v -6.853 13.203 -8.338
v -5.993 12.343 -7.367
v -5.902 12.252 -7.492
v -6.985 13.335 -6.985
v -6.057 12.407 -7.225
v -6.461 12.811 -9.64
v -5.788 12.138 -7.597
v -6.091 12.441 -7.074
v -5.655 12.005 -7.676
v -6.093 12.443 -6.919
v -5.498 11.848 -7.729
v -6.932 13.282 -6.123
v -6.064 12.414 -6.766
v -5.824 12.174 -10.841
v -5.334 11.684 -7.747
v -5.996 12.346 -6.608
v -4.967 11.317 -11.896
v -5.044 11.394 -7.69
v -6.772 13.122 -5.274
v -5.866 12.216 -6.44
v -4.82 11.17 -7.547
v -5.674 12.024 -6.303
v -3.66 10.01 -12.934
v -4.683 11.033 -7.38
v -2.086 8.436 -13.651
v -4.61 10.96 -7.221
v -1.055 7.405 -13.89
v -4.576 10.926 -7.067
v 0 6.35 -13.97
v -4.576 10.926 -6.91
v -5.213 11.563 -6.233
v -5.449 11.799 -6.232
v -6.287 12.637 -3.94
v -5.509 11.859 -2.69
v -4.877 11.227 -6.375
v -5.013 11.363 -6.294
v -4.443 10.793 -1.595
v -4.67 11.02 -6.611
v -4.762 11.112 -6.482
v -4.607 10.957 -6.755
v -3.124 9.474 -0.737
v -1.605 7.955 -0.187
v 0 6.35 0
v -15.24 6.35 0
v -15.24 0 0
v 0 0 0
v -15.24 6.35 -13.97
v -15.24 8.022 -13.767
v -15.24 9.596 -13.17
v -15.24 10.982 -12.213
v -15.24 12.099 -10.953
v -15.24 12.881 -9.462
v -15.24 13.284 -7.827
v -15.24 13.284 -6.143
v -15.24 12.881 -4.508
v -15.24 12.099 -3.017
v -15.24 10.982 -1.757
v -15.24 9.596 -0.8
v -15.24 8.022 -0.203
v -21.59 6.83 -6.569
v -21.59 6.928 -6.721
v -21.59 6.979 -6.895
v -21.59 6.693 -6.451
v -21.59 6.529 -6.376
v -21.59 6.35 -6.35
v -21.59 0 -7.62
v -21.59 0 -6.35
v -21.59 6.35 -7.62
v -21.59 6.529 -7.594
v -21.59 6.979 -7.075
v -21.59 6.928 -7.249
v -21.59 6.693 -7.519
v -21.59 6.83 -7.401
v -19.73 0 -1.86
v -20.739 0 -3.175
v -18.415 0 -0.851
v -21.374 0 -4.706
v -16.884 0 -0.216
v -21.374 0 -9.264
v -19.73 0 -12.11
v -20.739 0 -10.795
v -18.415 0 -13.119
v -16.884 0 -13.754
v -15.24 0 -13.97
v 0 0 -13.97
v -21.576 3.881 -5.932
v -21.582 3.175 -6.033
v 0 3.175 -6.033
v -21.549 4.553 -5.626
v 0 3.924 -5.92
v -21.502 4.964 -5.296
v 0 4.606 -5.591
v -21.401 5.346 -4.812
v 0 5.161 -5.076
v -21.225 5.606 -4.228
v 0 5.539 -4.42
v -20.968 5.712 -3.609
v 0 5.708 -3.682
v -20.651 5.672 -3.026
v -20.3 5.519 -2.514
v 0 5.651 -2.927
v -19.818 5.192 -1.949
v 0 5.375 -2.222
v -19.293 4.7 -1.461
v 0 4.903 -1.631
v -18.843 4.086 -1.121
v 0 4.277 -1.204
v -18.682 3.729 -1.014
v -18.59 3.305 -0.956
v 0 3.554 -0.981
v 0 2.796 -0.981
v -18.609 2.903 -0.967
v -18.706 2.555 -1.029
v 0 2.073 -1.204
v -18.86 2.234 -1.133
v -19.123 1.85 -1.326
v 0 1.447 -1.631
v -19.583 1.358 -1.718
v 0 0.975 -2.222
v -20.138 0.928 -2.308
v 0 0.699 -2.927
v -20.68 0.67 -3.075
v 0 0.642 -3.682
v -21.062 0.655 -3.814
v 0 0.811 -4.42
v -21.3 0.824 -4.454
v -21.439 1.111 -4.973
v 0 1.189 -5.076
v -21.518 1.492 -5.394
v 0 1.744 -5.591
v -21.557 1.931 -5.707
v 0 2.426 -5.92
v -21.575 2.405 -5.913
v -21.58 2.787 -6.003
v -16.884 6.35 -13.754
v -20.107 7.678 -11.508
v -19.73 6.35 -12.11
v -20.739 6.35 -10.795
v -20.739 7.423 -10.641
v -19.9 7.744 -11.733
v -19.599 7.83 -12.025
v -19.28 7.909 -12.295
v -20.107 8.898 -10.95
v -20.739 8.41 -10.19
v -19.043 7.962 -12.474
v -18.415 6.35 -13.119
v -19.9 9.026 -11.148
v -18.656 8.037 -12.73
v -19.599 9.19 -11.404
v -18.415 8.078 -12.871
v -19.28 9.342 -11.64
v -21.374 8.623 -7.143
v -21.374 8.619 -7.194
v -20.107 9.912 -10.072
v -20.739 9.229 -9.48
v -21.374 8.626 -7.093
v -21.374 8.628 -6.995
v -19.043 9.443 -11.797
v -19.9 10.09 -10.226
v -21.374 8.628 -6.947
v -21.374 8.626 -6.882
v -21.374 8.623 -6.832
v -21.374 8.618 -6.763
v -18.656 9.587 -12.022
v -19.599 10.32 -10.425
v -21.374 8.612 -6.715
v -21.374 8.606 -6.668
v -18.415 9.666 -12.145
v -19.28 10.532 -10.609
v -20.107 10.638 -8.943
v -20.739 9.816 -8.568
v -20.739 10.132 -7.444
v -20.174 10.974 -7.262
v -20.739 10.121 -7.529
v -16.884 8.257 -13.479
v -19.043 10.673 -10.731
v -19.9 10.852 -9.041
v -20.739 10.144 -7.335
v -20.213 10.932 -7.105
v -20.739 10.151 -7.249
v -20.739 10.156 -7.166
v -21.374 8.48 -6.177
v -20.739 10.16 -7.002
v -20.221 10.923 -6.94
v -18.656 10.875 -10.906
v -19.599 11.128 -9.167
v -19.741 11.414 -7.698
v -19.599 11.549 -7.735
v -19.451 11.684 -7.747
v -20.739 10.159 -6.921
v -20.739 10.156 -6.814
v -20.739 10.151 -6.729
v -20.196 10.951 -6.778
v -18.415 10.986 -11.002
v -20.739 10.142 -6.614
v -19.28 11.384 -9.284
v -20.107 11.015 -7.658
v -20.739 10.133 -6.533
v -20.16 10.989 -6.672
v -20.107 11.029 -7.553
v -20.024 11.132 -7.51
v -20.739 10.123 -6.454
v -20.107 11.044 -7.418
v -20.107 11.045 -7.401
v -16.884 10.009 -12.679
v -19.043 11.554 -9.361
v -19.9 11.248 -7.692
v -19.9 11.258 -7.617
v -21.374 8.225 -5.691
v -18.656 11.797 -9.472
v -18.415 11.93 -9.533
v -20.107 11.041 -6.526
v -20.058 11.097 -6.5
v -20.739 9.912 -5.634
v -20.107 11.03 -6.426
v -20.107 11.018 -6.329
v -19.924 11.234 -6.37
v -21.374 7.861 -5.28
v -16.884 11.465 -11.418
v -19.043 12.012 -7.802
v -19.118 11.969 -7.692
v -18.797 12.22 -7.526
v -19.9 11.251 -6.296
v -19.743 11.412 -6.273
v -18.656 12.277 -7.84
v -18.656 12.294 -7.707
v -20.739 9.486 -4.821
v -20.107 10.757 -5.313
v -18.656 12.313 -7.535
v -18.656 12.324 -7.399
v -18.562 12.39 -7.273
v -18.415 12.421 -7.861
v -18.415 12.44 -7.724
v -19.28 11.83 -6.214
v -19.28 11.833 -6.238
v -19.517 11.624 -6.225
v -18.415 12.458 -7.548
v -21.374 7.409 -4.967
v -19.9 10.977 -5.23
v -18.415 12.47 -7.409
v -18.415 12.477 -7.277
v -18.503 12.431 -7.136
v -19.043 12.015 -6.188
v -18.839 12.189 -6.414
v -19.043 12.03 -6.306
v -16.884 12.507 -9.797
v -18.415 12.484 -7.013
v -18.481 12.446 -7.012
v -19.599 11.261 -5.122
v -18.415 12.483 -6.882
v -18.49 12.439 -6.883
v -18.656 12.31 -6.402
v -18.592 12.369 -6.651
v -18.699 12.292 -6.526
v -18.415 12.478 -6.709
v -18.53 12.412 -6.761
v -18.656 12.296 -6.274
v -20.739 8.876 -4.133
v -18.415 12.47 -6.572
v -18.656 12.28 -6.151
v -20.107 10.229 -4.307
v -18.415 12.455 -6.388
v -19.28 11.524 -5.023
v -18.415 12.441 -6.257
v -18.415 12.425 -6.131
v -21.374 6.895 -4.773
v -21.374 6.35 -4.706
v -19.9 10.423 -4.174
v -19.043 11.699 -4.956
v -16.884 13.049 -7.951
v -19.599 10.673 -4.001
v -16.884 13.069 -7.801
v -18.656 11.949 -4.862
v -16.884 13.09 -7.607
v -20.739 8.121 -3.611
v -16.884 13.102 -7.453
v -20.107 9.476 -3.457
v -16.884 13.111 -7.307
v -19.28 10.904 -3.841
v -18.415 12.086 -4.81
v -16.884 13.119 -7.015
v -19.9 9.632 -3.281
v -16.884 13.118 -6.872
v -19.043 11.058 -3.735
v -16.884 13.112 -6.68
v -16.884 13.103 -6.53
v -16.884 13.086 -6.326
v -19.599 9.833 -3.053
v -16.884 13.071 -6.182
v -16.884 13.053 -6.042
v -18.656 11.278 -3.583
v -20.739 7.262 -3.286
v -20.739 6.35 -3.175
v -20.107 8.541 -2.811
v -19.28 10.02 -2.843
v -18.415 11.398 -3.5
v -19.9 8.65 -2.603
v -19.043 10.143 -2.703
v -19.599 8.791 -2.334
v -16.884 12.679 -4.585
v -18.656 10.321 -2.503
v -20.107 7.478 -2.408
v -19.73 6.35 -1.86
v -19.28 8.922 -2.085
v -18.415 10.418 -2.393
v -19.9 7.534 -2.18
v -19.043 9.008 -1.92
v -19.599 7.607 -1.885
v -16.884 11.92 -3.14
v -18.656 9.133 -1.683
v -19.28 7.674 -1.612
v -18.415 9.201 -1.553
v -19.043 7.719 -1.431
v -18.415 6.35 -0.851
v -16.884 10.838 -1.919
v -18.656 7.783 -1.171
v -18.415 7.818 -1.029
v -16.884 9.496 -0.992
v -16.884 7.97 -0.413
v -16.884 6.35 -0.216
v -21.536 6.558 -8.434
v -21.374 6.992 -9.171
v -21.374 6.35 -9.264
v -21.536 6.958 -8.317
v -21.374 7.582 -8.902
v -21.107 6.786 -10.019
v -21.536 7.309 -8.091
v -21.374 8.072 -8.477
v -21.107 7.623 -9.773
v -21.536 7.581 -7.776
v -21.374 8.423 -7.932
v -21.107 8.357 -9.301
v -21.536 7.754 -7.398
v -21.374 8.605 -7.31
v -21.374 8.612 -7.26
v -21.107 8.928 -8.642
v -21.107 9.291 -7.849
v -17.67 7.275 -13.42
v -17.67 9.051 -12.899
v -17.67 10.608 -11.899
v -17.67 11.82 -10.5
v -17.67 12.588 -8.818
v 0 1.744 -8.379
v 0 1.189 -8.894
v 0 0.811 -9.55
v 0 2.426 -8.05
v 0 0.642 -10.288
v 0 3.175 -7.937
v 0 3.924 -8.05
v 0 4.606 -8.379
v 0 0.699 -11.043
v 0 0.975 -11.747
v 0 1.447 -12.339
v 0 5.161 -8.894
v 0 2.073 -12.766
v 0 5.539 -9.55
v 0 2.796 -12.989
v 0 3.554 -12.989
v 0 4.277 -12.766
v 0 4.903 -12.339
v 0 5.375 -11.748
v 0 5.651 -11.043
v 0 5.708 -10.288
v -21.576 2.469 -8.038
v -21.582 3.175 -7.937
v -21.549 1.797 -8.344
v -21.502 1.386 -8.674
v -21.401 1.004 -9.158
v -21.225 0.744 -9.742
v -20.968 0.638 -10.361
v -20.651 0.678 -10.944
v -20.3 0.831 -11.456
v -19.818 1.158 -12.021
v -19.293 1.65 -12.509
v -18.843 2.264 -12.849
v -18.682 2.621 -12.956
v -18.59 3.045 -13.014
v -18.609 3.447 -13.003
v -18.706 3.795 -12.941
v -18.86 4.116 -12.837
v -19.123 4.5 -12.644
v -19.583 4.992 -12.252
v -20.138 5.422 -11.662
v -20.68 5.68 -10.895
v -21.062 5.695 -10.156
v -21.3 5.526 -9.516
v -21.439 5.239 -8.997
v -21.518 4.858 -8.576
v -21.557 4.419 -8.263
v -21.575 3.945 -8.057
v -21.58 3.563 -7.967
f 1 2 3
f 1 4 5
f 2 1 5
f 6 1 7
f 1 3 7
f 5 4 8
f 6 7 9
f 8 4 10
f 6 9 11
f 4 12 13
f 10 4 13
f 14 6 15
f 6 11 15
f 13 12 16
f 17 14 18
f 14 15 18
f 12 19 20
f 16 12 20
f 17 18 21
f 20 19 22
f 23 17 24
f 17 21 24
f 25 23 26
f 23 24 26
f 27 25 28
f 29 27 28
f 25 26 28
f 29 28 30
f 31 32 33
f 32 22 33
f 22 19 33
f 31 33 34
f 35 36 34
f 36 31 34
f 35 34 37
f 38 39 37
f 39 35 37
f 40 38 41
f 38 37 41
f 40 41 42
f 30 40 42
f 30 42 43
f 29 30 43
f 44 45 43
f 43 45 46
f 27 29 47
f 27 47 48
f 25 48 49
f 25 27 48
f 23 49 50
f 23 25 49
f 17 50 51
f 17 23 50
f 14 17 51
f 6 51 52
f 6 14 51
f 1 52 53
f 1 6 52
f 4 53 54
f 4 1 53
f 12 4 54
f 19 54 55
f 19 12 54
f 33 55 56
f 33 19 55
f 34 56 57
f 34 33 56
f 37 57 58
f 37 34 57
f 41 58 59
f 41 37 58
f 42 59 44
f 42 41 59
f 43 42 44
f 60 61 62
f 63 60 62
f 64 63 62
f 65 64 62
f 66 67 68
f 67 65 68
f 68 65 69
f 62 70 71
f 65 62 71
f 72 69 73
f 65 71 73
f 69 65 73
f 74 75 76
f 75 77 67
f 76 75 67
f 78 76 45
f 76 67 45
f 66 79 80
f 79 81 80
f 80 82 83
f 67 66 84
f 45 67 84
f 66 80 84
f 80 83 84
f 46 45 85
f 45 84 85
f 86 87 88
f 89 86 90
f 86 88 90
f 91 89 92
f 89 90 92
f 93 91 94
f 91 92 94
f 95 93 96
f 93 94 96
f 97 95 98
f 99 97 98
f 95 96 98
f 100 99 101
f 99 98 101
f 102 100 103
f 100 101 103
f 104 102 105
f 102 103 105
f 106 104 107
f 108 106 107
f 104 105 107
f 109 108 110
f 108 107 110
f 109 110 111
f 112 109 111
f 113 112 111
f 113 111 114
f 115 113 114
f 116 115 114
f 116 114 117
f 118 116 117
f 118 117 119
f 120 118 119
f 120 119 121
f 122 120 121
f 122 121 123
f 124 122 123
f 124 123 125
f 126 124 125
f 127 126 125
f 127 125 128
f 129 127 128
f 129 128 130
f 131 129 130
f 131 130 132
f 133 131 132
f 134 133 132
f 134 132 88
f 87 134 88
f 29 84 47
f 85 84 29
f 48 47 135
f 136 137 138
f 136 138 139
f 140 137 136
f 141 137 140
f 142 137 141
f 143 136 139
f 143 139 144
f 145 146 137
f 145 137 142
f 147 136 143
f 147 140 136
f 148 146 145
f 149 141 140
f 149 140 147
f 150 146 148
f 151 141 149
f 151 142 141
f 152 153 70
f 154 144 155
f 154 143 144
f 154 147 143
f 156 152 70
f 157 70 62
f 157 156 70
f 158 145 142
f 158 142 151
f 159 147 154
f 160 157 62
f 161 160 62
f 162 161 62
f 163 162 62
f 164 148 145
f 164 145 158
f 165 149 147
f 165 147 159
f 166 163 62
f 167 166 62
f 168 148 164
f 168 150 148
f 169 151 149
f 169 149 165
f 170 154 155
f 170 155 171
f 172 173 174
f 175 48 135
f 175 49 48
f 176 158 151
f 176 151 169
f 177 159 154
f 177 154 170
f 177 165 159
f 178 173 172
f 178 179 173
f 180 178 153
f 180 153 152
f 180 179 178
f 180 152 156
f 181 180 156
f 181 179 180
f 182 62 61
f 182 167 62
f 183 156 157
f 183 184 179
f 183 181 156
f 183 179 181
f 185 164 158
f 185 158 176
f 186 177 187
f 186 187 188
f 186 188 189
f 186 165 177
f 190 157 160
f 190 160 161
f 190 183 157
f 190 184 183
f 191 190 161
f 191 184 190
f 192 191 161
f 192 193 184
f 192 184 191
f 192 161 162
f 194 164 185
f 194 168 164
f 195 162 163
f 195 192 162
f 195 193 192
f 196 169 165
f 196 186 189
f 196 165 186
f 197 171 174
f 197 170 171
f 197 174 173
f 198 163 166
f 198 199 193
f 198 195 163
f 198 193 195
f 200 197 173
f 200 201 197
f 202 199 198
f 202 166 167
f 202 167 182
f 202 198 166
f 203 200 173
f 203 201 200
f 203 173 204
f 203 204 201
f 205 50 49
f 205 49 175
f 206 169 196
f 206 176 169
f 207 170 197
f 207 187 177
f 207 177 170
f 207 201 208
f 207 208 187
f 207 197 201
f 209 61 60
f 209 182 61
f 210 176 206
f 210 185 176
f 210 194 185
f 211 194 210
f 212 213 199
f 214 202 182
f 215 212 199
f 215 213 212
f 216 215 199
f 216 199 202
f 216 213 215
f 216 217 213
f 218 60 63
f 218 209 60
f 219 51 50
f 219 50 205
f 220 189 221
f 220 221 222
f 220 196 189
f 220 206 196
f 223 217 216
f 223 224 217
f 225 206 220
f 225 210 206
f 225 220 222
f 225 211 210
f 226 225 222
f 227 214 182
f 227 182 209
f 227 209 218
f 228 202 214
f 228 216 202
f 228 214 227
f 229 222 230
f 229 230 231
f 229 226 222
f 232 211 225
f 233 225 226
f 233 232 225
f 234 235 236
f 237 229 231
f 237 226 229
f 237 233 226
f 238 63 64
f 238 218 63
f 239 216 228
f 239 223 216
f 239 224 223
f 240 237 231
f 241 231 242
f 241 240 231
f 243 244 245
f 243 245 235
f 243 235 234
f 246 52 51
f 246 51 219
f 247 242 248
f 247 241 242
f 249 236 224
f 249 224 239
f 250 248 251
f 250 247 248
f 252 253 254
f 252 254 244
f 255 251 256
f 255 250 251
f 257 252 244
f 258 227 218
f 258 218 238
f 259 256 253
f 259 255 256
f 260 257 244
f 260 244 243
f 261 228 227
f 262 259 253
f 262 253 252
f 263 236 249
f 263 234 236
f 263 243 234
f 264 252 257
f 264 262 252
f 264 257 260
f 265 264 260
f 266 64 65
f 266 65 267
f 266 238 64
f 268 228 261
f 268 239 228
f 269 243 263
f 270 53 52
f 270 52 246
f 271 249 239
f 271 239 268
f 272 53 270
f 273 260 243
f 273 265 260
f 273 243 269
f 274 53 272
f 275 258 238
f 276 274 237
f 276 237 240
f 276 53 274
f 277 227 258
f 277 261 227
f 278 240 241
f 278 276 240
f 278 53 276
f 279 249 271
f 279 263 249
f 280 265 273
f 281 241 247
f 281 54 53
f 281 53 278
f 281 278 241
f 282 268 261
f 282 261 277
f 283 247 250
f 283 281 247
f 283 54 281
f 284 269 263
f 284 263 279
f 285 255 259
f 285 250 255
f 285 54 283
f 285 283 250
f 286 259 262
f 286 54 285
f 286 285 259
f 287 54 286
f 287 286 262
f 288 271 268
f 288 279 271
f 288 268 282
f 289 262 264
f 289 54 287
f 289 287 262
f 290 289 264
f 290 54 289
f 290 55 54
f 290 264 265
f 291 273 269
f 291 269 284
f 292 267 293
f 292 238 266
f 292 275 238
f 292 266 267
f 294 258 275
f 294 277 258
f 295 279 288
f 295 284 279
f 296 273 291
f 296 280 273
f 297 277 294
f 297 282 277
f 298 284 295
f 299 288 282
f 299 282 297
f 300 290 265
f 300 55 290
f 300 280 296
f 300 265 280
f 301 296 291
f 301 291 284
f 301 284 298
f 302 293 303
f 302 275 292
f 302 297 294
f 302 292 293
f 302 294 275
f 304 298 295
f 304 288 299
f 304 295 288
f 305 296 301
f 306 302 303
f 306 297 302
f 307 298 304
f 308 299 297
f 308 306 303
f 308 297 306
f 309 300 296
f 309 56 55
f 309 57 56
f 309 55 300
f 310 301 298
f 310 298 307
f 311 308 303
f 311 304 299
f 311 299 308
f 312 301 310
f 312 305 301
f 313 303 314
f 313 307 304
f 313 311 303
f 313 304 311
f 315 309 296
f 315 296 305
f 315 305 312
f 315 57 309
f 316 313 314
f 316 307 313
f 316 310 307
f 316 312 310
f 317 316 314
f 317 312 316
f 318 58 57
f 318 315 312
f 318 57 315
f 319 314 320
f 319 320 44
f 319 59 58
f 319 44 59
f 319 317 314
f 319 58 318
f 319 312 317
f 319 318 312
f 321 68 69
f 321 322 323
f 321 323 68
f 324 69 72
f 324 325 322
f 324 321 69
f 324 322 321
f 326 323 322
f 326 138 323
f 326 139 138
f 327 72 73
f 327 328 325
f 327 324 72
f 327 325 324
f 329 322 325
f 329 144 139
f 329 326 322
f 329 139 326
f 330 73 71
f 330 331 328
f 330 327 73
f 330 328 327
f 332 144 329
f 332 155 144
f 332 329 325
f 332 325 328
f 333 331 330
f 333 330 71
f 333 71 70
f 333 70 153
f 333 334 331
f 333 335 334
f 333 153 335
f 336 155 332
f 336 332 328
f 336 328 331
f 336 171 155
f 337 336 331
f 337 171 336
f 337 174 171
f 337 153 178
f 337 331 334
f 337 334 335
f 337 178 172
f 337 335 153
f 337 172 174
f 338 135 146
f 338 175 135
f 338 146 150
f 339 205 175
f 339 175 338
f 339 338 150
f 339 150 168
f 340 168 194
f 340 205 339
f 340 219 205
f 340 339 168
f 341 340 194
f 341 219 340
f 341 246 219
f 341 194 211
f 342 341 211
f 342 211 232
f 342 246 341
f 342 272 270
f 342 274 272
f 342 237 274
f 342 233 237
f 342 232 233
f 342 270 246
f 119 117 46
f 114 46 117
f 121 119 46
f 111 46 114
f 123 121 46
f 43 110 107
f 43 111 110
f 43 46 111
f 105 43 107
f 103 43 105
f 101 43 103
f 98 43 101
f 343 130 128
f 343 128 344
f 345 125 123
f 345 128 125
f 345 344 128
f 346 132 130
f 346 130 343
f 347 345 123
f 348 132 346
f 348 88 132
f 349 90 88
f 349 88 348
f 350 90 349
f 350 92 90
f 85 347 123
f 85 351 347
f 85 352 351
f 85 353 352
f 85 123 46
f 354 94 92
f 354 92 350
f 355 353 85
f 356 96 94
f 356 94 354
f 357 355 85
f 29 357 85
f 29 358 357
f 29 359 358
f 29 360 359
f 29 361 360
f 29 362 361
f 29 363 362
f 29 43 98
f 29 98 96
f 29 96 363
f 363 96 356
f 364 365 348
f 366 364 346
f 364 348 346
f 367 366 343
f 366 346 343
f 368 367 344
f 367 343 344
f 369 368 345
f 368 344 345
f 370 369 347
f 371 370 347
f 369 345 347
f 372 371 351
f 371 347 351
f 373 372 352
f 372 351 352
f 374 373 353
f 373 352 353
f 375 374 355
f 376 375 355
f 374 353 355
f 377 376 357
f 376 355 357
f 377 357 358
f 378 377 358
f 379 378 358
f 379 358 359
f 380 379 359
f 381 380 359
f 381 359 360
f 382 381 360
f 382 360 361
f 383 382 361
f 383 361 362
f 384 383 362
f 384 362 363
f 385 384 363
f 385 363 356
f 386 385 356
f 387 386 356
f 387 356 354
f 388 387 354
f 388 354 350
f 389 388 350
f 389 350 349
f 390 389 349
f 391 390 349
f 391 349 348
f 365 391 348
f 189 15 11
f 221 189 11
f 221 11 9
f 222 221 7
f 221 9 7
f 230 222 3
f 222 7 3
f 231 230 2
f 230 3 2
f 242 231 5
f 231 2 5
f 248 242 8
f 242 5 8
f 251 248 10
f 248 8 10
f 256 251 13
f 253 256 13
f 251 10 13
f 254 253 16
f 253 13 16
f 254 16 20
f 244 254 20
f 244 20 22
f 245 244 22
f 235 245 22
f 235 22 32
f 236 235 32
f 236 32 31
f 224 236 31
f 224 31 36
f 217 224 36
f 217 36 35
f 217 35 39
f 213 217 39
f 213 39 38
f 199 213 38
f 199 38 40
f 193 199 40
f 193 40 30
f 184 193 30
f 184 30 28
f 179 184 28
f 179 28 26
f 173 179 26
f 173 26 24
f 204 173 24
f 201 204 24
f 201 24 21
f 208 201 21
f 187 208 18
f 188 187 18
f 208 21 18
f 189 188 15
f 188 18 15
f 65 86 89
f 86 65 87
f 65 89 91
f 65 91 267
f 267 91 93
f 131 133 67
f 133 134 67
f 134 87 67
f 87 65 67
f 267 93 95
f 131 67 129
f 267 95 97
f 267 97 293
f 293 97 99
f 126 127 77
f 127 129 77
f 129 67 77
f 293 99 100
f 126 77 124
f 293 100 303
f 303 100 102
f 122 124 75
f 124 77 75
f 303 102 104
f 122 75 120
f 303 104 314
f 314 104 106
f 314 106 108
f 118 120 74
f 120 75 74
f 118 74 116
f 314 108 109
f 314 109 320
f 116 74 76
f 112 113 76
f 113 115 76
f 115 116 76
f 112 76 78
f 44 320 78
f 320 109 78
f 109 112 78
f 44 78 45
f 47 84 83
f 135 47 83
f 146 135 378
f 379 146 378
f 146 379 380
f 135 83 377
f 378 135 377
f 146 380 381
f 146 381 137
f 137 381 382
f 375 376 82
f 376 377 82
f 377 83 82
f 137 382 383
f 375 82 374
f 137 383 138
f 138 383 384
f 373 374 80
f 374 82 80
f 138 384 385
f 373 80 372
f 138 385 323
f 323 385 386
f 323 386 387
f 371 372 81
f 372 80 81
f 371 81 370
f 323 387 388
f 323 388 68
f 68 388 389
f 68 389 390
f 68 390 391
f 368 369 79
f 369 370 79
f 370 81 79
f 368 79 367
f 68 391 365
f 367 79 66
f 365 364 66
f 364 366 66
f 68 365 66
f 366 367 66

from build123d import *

# Parameters (mm, degrees)
SKETCH1_W              = 21.59
SKETCH1_H              = 13.97
DEPTH_A_DEPTH          = 6.35
ROUND_EXTRUDE_DEPTH    = 21.59
ANGLE_CUT_DEPTH        = 29.967416609
STRING_HOLE_R          = 0.762
STRING_HOLE_CUT_DEPTH  = 29.967416609
ELASTIC_HOLES_R        = 2.54
ELASTIC_HOLE_CUT_DEPTH = 29.967416609
FILLET1_R              = 6.35


with BuildPart() as part:
    # Sketch1 → depth a (new body)
    with BuildSketch(Plane(origin=(0, 0, 0), x_dir=(1, 0, 0), z_dir=(0, 1, 0))):
        with Locations((-10.795, 6.985)):
            Rectangle(SKETCH1_W, SKETCH1_H)
    extrude(amount=DEPTH_A_DEPTH)

    # Sketch4 → round extrude (add)
    with BuildSketch(Plane(origin=(0, 0, 0), x_dir=(0, 0, -1), z_dir=(1, 0, 0))):
        with BuildLine():
            Line((0, 6.35), (13.97, 6.35))
            ThreePointArc((13.97, 6.35), (6.985, 13.335), (0, 6.35))
        make_face()
    extrude(amount=-ROUND_EXTRUDE_DEPTH)

    # Sketch5 → angle cut (cut, through all)
    with BuildSketch(Plane.XY):
        Polygon((0, 6.35), (0, 13.335), (-6.985, 13.335), align=None)
    extrude(amount=-ANGLE_CUT_DEPTH, mode=Mode.SUBTRACT)

    # string hole → string hole cut (cut, through all)
    with BuildSketch(Plane(origin=(0, 0, 0), x_dir=(0, 0, -1), z_dir=(1, 0, 0))):
        with Locations((6.985, 11.684)):
            Circle(STRING_HOLE_R)
    extrude(amount=-STRING_HOLE_CUT_DEPTH, mode=Mode.SUBTRACT)

    # elastic holes → elastic hole cut (cut, through all)
    with BuildSketch(Plane(origin=(0, 0, 0), x_dir=(0, 0, -1), z_dir=(1, 0, 0))):
        with Locations((3.4925, 3.175)):
            Circle(ELASTIC_HOLES_R)
        with Locations(Location((10.4775, 3.175, 0), (0, 0, 180))):
            Circle(ELASTIC_HOLES_R)
    extrude(amount=-ELASTIC_HOLE_CUT_DEPTH, mode=Mode.SUBTRACT)

    # Fillet1
    # the kernel refuses this fillet: 6.35 mm, written as the material it takes off along each edge
    with BuildSketch(Plane(origin=(-21.59, 6.35, -6.985), x_dir=(0, 0, -1), z_dir=(0, -1, 0))) as fillet1_piece_1:
        with BuildLine():
            CenterArc((6.985 - FILLET1_R, FILLET1_R), FILLET1_R, 270, 90)
            Line((6.985, FILLET1_R), (6.985, 0))
            Line((6.985, 0), (6.985 - FILLET1_R, 0))
        make_face()
    revolve(axis=Axis((-21.59, 6.35, -6.985), (1, 0, 0)), revolution_arc=180, mode=Mode.SUBTRACT)
    with BuildSketch(Plane(origin=(-21.59, -15.875, 0), x_dir=(1, 0, 0), z_dir=(0, 1, 0)), Plane(origin=(-21.59, -15.875, -13.97), x_dir=(0, 0, 1), z_dir=(0, 1, 0))) as fillet1_piece_2:
        with BuildLine():
            CenterArc((FILLET1_R, FILLET1_R), FILLET1_R, 180, 90)
            Line((0, FILLET1_R), (0, 0))
            Line((0, 0), (FILLET1_R, 0))
        make_face()
    extrude(amount=22.225, mode=Mode.SUBTRACT)


solid = part.part
